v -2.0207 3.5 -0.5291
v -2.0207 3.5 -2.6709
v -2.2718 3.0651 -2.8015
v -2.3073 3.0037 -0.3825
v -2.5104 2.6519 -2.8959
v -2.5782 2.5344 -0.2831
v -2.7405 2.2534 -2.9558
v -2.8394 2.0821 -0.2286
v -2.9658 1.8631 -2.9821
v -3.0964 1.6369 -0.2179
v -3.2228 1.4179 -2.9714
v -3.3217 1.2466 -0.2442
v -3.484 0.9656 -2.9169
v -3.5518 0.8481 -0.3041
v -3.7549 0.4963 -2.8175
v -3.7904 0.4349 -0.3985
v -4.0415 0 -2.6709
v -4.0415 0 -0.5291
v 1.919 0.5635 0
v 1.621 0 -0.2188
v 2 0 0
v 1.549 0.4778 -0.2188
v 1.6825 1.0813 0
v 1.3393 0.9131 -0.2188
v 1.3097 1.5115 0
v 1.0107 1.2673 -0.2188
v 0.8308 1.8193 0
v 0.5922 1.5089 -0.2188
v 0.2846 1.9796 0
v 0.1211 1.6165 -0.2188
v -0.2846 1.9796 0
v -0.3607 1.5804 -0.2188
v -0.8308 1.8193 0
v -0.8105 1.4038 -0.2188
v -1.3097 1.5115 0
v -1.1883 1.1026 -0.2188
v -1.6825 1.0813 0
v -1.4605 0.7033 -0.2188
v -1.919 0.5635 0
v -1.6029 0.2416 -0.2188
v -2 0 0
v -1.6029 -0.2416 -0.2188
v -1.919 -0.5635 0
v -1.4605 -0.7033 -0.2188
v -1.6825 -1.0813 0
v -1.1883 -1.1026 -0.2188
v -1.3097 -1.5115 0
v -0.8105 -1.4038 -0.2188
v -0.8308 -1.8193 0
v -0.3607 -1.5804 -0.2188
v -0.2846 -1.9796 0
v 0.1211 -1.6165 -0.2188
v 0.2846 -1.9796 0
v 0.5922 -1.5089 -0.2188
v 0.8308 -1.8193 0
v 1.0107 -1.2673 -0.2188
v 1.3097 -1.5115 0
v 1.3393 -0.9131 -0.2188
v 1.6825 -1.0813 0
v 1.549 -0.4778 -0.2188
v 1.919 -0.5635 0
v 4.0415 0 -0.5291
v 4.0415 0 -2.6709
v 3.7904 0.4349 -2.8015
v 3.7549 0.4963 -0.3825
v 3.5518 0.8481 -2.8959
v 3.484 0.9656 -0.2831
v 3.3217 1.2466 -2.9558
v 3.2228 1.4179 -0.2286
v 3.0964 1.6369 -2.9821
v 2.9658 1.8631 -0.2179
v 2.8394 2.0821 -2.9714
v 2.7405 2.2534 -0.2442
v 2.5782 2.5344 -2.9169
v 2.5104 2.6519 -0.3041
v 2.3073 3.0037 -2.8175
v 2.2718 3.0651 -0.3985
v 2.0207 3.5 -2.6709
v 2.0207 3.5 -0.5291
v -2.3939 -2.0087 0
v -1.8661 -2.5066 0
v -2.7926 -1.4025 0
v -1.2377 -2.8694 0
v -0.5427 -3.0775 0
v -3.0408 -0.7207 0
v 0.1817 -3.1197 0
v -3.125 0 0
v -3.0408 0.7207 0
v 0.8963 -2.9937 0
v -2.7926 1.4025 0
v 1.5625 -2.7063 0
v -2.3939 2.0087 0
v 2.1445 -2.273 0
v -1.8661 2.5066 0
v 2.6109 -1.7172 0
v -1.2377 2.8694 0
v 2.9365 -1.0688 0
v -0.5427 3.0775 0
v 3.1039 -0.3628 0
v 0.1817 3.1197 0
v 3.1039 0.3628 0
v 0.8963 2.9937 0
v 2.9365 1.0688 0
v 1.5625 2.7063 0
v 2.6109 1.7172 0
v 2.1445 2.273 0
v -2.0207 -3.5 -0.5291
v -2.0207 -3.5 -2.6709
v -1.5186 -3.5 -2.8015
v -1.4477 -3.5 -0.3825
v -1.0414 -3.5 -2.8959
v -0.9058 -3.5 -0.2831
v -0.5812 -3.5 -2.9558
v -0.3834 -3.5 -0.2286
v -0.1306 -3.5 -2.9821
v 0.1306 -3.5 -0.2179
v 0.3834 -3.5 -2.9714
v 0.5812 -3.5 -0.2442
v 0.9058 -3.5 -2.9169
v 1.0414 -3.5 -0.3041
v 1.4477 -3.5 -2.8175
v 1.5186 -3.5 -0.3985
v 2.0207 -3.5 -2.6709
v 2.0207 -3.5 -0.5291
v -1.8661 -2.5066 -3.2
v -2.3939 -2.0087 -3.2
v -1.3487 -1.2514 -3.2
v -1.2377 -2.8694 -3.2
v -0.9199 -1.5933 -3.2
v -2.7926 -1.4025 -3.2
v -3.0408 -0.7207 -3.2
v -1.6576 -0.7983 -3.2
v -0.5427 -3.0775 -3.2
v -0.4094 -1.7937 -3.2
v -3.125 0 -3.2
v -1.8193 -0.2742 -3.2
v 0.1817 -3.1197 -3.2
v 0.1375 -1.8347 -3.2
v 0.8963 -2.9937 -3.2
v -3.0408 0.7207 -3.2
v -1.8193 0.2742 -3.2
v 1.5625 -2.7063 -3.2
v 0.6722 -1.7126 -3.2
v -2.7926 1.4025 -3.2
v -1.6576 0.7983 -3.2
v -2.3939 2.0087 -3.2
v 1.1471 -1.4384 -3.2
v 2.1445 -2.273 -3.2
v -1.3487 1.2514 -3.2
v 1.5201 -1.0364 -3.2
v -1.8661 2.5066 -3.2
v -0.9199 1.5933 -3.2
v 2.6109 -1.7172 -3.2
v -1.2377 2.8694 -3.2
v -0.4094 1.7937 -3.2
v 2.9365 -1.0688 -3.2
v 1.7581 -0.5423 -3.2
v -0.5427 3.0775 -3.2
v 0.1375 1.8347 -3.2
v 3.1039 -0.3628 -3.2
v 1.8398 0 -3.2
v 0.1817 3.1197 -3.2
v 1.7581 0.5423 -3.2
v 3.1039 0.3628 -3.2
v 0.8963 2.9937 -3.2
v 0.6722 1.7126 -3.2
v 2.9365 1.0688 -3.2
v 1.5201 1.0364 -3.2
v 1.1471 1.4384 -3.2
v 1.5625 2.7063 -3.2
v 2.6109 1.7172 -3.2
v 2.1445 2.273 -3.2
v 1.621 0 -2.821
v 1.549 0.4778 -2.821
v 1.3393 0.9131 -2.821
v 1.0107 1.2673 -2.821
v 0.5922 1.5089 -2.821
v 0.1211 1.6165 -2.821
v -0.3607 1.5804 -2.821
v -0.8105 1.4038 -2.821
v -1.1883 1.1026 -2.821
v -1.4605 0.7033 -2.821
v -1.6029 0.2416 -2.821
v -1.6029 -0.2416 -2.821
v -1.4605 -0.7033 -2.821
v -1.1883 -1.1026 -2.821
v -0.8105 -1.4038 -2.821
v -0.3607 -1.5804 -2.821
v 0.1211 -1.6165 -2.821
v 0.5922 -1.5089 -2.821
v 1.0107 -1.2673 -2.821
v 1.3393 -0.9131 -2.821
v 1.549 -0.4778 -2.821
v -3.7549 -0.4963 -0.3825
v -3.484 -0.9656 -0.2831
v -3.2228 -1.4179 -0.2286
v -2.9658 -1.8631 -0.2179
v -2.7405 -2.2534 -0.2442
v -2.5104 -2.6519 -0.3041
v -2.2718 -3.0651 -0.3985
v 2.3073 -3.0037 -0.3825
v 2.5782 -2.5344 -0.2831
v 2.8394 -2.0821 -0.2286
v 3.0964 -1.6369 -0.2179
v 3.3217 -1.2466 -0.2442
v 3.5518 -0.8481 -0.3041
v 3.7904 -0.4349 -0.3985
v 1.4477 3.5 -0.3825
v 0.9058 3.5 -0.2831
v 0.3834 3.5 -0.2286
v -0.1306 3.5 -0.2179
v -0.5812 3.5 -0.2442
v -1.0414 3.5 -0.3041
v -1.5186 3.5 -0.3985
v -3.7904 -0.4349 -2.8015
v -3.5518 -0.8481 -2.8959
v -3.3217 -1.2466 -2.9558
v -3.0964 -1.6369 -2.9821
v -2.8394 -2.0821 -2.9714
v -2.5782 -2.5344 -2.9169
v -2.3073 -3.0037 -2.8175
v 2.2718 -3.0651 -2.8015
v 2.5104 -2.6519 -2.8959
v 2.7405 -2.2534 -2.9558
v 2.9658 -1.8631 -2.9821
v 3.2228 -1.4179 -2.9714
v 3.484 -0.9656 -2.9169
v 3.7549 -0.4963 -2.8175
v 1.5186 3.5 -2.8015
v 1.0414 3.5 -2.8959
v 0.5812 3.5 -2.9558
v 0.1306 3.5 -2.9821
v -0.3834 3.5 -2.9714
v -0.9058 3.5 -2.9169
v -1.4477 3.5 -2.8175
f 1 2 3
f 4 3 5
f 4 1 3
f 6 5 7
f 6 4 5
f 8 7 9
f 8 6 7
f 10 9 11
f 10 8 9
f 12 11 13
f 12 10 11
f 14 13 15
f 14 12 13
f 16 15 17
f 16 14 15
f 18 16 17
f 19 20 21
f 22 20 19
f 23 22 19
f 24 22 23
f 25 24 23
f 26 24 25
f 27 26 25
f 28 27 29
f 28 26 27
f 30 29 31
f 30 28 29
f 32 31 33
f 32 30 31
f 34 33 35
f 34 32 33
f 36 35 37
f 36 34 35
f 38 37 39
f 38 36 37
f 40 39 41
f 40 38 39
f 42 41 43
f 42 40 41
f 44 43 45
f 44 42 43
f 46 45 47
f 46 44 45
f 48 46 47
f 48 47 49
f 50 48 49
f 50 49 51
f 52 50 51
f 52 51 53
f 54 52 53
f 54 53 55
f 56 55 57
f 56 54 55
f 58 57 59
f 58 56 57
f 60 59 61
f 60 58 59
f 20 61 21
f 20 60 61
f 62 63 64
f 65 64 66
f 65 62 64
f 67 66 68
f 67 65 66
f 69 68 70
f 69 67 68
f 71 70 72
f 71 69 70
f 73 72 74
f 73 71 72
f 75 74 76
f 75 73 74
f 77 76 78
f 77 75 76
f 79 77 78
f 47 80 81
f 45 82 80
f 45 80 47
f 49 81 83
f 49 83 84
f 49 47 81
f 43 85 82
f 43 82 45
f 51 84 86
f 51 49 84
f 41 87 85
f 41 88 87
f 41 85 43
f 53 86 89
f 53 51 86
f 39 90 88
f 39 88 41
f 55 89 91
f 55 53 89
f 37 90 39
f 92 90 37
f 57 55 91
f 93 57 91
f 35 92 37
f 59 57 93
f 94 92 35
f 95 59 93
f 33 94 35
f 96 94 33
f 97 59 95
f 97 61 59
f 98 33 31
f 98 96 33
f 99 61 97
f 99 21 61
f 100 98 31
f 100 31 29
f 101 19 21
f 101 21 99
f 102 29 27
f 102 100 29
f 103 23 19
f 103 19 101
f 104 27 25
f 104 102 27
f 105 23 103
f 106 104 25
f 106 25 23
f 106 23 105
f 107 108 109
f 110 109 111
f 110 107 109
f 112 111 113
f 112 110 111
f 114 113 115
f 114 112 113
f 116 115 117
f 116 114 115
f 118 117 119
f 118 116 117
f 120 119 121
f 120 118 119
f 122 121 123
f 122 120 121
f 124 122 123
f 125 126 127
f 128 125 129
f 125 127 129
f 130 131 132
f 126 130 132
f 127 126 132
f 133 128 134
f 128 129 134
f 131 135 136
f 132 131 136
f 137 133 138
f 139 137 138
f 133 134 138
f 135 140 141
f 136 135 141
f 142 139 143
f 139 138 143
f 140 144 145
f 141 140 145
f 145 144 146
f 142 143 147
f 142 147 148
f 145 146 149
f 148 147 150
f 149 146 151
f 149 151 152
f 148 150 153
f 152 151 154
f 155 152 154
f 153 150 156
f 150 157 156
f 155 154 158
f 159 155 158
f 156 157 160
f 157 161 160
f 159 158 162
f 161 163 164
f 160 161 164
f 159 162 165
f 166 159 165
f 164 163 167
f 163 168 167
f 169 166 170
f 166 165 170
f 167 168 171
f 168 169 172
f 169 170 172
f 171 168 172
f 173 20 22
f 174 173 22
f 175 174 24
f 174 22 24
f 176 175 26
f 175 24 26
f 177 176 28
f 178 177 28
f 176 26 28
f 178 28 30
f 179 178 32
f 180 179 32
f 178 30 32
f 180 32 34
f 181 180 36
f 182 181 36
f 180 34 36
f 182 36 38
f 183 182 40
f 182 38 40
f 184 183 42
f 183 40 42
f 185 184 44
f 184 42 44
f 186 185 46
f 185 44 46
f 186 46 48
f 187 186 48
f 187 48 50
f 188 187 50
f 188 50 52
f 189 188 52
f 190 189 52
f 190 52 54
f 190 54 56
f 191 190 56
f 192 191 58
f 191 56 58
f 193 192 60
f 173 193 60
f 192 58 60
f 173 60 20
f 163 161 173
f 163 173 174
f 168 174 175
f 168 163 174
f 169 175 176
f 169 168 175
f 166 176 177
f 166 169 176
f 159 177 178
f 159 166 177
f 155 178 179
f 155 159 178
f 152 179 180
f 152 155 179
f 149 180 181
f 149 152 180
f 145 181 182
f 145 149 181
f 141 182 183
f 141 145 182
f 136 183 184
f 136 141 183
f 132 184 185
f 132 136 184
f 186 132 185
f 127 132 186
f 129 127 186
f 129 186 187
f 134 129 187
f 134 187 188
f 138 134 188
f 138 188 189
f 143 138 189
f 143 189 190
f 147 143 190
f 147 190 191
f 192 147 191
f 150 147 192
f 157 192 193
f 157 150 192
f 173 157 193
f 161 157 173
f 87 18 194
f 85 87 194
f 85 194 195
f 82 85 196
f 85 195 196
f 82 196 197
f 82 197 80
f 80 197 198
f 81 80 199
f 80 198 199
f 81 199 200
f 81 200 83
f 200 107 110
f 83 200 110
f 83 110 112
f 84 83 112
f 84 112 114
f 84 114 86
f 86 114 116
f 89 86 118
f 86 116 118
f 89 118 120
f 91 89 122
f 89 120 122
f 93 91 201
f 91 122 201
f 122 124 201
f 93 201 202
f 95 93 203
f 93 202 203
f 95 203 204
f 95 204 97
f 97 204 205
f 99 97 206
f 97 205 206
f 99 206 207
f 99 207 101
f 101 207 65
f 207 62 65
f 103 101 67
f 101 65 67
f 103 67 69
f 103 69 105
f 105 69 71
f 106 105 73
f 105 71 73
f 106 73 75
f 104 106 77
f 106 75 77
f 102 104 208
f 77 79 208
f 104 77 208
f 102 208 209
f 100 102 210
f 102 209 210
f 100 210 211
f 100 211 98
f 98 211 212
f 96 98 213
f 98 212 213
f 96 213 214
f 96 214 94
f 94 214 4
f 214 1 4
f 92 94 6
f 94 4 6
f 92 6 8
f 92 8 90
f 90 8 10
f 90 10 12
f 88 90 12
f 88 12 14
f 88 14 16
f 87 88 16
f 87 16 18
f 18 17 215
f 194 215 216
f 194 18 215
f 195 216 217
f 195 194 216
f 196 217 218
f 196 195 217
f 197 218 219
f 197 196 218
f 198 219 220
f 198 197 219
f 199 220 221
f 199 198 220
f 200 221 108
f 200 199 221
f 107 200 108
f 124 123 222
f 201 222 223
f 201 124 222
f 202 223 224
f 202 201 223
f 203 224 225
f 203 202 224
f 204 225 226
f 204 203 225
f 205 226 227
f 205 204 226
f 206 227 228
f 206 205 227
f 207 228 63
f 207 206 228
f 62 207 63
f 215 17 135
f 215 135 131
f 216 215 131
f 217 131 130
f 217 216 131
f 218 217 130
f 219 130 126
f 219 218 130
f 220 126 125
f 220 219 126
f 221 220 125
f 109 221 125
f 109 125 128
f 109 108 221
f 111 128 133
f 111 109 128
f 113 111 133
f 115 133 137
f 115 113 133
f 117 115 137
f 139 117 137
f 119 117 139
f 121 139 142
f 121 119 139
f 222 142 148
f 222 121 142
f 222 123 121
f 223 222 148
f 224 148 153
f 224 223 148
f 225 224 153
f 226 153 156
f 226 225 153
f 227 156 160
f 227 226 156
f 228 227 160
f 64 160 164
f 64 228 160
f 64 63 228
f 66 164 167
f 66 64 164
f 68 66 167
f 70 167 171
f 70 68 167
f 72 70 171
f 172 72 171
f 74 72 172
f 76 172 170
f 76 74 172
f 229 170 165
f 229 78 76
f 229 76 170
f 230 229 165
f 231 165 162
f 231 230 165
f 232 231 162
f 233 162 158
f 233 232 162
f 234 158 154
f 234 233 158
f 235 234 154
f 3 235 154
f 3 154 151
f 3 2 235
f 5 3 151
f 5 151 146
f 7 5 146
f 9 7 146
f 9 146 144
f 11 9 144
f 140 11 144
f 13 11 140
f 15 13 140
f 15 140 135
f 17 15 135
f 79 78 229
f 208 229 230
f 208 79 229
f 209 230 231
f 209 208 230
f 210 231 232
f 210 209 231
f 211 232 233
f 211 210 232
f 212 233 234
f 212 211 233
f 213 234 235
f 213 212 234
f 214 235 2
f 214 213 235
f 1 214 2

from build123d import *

# Parameters (mm, degrees)
SKETCH1_R               = 1.621
BASENUT_DEPTH           = 3.2
ENDCHAMFER_SIZE         = 0.379
ENDCHAMFER_SIZE2        = 0.218815752
ENDCHAMFER_PART_2_SIZE  = 0.379
ENDCHAMFER_PART_2_SIZE2 = 0.218815752


with BuildPart() as part:
    # Sketch1 → BaseNut (new body)
    with BuildSketch(Plane.XY):
        Polygon((4.041451884, 0), (2.020725942, 3.5), (-2.020725942, 3.5), (-4.041451884, 0), (-2.020725942, -3.5), (2.020725942, -3.5), align=None)
        Circle(SKETCH1_R, mode=Mode.SUBTRACT)
    extrude(amount=-BASENUT_DEPTH)

    # Sketch2 → Double-Chamfer (revolve, cut)
    with BuildSketch(Plane(origin=(0, 0, 0), x_dir=(1, 0, 0), z_dir=(0, 1, 0))):
        Polygon((-4.041451884, 3.2), (-3.125, 3.2), (-4.041451884, 2.670886258), align=None)
        Polygon((-4.041451884, 0.529113742), (-4.041451884, 0), (-3.125, 0), align=None)
    revolve(axis=Axis((0, 0, -3.375940562), (0, 0, 1)), mode=Mode.SUBTRACT)

    # EndChamfer
    endchamfer_edges = [part.edges().sort_by_distance(p)[0] for p in [
        (-1.621, 0, -3.2),
    ]]
    endchamfer_side = [part.faces().sort_by_distance(p)[0] for p in [
        (-1.621, 0, -1.6),
    ]]
    chamfer(endchamfer_edges, length=ENDCHAMFER_SIZE, length2=ENDCHAMFER_SIZE2, reference=endchamfer_side[0])

    # EndChamfer part 2
    endchamfer_part_2_edges = [part.edges().sort_by_distance(p)[0] for p in [
        (-1.621, 0, 0),
    ]]
    endchamfer_part_2_side = [part.faces().sort_by_distance(p)[0] for p in [
        (3.036611652, 0, 0),
    ]]
    chamfer(endchamfer_part_2_edges, length=ENDCHAMFER_PART_2_SIZE, length2=ENDCHAMFER_PART_2_SIZE2, reference=endchamfer_part_2_side[0])


solid = part.part
